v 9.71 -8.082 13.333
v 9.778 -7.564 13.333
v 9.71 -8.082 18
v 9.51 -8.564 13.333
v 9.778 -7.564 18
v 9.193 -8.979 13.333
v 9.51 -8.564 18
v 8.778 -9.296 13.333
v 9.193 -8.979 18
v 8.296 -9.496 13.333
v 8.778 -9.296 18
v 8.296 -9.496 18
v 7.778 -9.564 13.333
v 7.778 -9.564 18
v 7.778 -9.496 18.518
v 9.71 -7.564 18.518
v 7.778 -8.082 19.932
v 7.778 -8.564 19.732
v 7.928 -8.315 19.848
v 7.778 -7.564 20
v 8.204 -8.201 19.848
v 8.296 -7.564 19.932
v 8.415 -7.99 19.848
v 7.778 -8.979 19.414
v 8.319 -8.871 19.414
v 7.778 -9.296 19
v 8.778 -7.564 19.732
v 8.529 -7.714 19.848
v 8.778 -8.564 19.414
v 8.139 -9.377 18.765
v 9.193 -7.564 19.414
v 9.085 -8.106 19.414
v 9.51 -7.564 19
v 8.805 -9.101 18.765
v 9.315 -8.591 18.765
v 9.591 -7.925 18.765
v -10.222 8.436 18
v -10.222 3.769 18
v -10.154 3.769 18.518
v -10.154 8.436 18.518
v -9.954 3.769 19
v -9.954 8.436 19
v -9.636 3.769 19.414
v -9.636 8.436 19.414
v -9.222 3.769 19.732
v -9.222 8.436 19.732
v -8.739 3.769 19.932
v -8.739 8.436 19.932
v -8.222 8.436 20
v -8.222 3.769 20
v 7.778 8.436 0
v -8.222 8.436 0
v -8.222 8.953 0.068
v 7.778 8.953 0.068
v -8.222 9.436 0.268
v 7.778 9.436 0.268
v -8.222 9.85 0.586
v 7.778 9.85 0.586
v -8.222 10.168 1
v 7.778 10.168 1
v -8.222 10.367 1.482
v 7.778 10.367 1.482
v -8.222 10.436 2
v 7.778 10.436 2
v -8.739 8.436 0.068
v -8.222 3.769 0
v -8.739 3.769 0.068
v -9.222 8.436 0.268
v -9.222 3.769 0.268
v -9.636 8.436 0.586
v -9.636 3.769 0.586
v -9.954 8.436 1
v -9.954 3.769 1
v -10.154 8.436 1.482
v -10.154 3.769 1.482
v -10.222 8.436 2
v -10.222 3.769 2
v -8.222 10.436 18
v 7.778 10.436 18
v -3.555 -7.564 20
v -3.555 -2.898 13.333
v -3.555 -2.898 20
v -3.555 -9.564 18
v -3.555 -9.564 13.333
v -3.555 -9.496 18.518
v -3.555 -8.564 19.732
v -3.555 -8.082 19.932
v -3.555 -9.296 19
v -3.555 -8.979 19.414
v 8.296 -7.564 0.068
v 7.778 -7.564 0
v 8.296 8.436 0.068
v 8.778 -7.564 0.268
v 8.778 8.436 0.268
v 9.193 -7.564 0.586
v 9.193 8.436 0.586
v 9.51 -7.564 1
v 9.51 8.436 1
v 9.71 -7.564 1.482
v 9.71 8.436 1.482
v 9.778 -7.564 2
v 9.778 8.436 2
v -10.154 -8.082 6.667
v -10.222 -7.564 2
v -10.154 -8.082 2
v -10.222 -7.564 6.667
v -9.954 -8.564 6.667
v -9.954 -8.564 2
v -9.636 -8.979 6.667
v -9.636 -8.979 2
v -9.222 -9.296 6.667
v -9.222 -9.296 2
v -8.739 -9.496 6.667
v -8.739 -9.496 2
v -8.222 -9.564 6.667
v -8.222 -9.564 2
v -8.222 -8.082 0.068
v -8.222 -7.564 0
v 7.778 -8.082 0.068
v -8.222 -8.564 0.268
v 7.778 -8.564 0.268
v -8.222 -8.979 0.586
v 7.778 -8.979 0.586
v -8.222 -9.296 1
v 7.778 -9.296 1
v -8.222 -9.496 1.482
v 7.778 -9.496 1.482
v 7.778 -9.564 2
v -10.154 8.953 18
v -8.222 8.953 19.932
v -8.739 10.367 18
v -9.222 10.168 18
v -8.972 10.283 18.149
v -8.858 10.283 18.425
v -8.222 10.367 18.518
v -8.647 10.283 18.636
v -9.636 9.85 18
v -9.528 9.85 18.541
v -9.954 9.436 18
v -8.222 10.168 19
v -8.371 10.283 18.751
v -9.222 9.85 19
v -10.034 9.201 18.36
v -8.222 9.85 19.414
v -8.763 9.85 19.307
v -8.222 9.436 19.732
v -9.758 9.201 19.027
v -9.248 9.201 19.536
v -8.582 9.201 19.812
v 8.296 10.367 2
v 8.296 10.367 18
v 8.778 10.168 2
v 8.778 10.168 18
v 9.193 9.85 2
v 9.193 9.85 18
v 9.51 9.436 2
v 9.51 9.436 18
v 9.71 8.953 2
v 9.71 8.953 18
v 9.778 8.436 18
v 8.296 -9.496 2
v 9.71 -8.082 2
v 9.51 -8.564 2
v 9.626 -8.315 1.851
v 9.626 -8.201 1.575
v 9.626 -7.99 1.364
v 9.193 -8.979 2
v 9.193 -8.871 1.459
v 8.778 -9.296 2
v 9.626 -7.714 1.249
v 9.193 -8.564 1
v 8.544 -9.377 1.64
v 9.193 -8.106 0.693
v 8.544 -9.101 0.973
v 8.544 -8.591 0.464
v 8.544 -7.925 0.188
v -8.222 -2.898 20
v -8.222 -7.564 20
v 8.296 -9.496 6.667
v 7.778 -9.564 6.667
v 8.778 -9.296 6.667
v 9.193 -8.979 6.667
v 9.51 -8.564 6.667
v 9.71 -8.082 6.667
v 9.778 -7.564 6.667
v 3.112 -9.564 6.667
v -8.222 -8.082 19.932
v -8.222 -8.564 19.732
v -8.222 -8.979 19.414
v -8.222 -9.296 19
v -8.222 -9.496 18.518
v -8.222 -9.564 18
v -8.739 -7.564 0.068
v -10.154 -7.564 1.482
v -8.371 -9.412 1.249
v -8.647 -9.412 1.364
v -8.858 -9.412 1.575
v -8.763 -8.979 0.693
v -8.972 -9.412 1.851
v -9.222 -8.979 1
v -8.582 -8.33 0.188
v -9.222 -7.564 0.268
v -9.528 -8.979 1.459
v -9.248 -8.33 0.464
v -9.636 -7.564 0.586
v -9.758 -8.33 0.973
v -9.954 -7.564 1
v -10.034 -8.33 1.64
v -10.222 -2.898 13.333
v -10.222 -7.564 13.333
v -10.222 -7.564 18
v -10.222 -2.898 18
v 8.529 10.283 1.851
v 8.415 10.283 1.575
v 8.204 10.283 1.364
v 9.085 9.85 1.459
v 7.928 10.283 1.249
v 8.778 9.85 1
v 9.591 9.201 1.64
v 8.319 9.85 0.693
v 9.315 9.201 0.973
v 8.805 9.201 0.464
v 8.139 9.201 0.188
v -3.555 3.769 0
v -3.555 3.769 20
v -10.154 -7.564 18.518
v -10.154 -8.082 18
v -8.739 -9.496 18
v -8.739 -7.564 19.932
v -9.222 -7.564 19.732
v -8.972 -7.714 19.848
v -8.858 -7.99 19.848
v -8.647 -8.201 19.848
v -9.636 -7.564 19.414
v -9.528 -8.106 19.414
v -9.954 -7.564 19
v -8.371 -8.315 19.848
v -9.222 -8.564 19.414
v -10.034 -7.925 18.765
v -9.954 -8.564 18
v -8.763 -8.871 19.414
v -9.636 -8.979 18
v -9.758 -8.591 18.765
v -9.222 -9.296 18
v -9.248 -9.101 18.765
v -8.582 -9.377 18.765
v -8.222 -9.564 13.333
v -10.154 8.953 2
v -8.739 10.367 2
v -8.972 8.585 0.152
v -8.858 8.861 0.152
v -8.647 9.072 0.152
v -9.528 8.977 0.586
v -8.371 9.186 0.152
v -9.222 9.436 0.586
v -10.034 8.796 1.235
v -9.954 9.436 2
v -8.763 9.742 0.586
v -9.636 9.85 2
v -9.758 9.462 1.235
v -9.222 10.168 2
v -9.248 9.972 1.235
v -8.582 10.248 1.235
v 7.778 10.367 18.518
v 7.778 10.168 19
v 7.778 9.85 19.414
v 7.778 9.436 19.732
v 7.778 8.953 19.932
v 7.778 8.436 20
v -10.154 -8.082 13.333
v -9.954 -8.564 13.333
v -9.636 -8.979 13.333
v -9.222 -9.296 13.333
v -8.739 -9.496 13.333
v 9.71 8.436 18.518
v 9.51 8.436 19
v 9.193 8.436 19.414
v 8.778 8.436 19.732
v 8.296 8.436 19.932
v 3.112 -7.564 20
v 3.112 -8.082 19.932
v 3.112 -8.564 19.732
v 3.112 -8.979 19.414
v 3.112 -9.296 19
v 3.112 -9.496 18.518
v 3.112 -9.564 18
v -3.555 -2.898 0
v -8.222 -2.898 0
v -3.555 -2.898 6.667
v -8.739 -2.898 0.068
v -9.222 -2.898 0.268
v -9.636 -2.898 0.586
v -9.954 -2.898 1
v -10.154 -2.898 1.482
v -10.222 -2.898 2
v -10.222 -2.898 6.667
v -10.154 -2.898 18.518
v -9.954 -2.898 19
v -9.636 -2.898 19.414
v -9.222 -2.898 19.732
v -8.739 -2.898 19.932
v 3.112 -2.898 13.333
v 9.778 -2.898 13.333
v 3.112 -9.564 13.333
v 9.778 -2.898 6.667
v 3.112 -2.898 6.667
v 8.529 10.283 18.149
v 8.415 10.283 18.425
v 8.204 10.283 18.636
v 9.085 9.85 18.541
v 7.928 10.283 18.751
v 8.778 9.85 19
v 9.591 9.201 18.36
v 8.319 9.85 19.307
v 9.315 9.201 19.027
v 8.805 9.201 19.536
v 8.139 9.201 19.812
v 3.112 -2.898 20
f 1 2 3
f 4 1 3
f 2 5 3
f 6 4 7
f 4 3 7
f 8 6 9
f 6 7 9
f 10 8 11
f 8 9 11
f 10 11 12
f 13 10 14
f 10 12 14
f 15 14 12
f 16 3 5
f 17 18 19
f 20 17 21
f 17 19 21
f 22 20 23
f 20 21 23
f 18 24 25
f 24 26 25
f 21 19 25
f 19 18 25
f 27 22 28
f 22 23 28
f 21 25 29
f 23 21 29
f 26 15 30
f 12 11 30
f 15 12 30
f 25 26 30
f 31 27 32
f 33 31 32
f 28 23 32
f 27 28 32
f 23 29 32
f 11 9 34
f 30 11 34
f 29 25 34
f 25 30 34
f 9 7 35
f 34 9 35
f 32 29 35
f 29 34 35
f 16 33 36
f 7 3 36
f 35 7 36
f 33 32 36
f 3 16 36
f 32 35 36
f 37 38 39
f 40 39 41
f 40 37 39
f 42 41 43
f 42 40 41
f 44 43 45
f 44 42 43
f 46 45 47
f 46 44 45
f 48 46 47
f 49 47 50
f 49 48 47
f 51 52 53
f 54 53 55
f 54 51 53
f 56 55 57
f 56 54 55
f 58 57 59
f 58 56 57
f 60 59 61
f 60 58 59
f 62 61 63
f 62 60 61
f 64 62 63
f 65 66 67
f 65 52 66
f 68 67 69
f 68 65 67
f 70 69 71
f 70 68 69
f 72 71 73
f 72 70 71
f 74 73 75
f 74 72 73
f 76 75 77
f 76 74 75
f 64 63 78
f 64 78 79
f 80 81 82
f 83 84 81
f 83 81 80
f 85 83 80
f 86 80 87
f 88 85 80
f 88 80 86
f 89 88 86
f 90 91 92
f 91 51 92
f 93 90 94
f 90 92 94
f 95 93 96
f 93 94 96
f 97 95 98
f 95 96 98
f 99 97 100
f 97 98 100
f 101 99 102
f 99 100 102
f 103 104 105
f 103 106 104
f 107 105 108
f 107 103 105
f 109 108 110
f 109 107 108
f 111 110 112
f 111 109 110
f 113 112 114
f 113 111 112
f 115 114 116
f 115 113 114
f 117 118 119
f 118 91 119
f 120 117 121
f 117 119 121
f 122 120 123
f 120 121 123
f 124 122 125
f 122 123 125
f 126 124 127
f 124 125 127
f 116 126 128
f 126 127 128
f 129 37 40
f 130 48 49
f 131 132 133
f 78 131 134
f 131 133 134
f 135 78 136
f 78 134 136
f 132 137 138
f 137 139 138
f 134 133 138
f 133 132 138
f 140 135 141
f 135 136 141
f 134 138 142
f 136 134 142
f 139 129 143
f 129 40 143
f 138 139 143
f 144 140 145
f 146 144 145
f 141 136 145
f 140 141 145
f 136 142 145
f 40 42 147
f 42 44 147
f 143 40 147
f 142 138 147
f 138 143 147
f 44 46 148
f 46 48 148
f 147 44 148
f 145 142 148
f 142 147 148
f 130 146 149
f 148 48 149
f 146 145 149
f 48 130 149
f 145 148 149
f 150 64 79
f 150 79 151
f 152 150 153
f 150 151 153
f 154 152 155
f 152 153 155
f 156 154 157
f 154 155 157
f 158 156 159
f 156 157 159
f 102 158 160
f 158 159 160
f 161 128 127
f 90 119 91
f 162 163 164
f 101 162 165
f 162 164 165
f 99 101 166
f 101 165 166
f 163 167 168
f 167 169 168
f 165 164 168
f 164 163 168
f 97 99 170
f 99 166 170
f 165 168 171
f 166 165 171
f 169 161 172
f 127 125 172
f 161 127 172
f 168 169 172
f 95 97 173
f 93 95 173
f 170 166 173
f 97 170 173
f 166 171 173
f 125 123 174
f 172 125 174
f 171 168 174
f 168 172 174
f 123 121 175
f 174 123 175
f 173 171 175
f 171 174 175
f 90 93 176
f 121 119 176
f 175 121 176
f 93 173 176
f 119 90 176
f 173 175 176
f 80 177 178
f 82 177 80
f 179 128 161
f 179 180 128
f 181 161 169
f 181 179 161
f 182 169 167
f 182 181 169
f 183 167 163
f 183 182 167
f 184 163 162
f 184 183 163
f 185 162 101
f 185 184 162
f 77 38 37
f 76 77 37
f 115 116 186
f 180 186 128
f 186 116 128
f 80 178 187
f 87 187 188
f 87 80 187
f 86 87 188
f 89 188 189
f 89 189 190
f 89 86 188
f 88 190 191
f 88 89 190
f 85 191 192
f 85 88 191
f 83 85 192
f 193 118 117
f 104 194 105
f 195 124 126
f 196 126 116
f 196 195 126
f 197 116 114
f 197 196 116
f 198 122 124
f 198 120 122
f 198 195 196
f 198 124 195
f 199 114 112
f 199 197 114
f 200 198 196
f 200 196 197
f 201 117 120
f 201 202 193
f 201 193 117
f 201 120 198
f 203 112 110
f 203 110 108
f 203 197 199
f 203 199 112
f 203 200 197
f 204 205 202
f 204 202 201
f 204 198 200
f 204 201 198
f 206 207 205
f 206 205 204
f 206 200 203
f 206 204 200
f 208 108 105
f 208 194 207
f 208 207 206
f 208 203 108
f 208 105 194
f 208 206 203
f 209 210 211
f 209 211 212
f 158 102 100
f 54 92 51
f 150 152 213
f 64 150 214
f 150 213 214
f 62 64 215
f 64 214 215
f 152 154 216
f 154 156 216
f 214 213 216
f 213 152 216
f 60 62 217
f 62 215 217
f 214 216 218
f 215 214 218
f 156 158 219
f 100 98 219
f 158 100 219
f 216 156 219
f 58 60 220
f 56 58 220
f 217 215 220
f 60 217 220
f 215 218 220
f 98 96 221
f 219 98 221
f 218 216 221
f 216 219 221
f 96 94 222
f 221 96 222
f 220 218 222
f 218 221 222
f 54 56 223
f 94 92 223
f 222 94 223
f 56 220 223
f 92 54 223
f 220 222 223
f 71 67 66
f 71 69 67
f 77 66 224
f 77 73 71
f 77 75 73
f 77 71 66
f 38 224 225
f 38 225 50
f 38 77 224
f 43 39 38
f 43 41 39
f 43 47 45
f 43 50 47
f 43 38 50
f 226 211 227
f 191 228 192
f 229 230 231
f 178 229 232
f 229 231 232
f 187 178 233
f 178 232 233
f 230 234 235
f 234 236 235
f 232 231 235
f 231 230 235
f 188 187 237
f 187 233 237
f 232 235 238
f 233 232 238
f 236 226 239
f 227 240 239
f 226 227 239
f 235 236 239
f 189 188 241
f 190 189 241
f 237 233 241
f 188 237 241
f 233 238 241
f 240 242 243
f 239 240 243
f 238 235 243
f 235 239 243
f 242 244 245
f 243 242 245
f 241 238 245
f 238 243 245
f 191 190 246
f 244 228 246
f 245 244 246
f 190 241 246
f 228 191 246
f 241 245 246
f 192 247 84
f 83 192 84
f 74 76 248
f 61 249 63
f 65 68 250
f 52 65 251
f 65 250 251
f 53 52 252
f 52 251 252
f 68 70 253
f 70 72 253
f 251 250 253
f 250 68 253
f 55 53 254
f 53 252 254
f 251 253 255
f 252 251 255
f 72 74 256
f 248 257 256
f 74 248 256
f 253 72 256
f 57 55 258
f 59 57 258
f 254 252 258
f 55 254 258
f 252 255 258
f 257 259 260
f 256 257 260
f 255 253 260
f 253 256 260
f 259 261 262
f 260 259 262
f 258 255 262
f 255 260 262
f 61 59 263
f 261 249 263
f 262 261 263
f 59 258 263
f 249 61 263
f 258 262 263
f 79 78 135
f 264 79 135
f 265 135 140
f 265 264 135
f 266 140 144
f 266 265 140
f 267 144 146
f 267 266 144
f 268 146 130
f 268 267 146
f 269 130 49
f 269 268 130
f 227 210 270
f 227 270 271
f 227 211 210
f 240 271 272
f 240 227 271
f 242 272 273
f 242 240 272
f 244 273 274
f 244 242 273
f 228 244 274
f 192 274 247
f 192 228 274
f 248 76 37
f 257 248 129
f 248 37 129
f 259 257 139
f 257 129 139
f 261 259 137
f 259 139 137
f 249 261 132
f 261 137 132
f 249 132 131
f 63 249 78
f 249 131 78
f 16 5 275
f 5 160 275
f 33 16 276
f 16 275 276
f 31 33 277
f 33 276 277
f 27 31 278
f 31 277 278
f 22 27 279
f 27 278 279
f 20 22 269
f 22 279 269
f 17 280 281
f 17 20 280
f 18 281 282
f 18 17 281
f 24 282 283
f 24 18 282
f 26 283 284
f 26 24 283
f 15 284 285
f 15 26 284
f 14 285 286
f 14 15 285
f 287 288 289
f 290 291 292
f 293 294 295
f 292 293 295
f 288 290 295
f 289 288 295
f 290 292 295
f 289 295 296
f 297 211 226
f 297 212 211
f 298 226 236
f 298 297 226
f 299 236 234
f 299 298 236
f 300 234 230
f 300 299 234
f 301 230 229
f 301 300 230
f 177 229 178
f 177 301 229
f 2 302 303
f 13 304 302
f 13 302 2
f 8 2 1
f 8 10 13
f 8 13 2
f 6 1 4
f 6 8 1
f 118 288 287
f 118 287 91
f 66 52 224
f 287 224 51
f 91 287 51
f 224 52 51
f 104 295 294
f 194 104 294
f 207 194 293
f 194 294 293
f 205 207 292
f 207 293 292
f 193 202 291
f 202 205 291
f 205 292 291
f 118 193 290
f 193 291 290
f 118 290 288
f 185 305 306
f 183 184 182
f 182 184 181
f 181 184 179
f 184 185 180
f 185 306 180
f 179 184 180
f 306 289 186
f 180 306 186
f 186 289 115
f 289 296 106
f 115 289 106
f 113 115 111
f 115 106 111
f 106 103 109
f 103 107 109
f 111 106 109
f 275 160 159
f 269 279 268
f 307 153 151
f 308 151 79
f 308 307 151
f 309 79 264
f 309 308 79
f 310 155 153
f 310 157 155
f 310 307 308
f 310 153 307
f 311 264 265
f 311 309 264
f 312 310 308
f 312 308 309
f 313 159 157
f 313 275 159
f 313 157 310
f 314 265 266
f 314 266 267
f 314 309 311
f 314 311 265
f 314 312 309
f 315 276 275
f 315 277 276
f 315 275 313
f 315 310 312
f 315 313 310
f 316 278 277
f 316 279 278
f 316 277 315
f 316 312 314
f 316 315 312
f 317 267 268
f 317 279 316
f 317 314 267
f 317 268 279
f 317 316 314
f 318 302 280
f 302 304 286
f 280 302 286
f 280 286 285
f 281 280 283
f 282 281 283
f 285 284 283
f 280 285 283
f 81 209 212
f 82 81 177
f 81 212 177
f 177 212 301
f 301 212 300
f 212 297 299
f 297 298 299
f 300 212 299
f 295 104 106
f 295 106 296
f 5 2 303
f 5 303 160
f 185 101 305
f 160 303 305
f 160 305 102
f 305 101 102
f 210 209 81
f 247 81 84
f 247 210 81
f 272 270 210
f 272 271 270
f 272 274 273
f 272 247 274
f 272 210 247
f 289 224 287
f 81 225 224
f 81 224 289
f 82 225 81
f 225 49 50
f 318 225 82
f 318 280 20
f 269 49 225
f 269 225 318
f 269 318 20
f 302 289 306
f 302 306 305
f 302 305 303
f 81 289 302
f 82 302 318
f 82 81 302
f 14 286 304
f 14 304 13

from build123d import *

# Parameters (mm, degrees)
F1_W     = 20
F1_H     = 20
F2_DEPTH = 20
F3_W     = 6.6666666667
F3_H     = 20
F4_DEPTH = 6.6666666667
F5_W     = 6.6666666667
F5_H     = 6.6666666667
F6_DEPTH = 13.3333333333
F7_W     = 6.6666666667
F7_H     = 6.6666666667
F8_DEPTH = 6.6666666667
F9_R     = 2


with BuildPart() as f2:
    # F1 (on Top) → F2 (new body)
    with BuildSketch(Plane.XY):
        with Locations((-0.2217073925, 0.4356197339)):
            Rectangle(F1_W, F1_H)
    extrude(amount=F2_DEPTH)

    # F3 (on face) → F4 (cut)
    with BuildSketch(Plane(origin=(-10.2217073925, 0, 0), x_dir=(0, -1, 0), z_dir=(-1, 0, 0))):
        with Locations((-0.4356197339, 10)):
            Rectangle(F3_W, F3_H)
    extrude(amount=-F4_DEPTH, mode=Mode.SUBTRACT)

    # F5 (on face) → F6 (cut)
    with BuildSketch(Plane(origin=(-10.2217073925, 0, 0), x_dir=(0, -1, 0), z_dir=(-1, 0, 0))):
        with Locations((6.2310469328, 10)):
            Rectangle(F5_W, F5_H)
    extrude(amount=-F6_DEPTH, mode=Mode.SUBTRACT)

    # F7 (on face) → F8 (cut)
    with BuildSketch(Plane.XZ.offset(9.5643802661)):
        with Locations((6.4449592742, 10)):
            Rectangle(F7_W, F7_H)
        with Locations((-0.2217073925, 16.6666666667)):
            Rectangle(F7_W, F7_H)
    extrude(amount=-F8_DEPTH, mode=Mode.SUBTRACT)

    # F9
    f9_edges = [f2.edges().sort_by_distance(p)[0] for p in [
        (-10.221707, 7.102286, 20),
        (-10.221707, 10.43562, 10),
        (-10.221707, 7.102286, 0),
        (-10.221707, -6.231047, 0),
        (-0.221707, -9.56438, 0),
        (-10.221707, -9.56438, 16.666667),
        (-10.221707, -6.231047, 20),
        (-6.888374, -9.56438, 20),
        (9.778293, -9.56438, 3.333333),
        (9.778293, -9.56438, 16.666667),
        (6.444959, -9.56438, 20),
        (9.778293, 0.43562, 20),
        (9.778293, 0.43562, 0),
        (9.778293, 10.43562, 10),
        (-0.221707, 10.43562, 0),
        (-0.221707, 10.43562, 20),
        (-10.221707, -9.56438, 3.333333),
    ]]
    fillet(f9_edges, radius=F9_R)


solid = f2.part
